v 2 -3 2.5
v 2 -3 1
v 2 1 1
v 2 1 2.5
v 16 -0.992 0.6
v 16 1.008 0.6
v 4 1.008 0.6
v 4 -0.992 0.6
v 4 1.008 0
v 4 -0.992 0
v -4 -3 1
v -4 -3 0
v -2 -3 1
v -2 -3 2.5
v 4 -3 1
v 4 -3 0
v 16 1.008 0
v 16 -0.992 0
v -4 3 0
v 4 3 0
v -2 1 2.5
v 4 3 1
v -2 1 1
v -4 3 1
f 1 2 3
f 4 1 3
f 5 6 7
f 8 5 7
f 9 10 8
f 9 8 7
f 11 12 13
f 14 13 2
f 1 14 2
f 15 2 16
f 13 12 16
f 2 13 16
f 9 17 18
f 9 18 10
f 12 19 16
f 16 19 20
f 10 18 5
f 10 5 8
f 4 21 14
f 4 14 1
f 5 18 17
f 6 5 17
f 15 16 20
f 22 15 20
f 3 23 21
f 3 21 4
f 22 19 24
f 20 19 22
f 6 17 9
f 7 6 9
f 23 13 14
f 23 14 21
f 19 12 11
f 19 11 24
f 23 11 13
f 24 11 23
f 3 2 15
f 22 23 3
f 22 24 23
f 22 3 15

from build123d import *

# Parameters (mm, degrees)
SKETCH1_W           = 8
SKETCH1_H           = 6
BOSS_EXTRUDE1_DEPTH = 1
SKETCH2_W           = 4
SKETCH2_H           = 4
BOSS_EXTRUDE2_DEPTH = 1.5
SKETCH3_W           = 12
SKETCH3_H           = 2
BOSS_EXTRUDE3_DEPTH = 0.6


with BuildPart() as part:
    # Sketch1 → Boss-Extrude1 (new body)
    with BuildSketch(Plane.XY):
        Rectangle(SKETCH1_W, SKETCH1_H)
    extrude(amount=BOSS_EXTRUDE1_DEPTH)

    # Sketch2 → Boss-Extrude2 (add)
    with BuildSketch(Plane.XY.offset(1)):
        with Locations((0, -1)):
            Rectangle(SKETCH2_W, SKETCH2_H)
    extrude(amount=BOSS_EXTRUDE2_DEPTH)


with BuildPart() as body_2:
    # Sketch3 → Boss-Extrude3 (new body)
    with BuildSketch(Plane(origin=(0, 0, 0), x_dir=(-1, 0, 0), z_dir=(0, 0, -1))):
        with Locations((-10, 0.007571997)):
            Rectangle(SKETCH3_W, SKETCH3_H)
    extrude(amount=-BOSS_EXTRUDE3_DEPTH)


solid = Compound([part.part, body_2.part])
